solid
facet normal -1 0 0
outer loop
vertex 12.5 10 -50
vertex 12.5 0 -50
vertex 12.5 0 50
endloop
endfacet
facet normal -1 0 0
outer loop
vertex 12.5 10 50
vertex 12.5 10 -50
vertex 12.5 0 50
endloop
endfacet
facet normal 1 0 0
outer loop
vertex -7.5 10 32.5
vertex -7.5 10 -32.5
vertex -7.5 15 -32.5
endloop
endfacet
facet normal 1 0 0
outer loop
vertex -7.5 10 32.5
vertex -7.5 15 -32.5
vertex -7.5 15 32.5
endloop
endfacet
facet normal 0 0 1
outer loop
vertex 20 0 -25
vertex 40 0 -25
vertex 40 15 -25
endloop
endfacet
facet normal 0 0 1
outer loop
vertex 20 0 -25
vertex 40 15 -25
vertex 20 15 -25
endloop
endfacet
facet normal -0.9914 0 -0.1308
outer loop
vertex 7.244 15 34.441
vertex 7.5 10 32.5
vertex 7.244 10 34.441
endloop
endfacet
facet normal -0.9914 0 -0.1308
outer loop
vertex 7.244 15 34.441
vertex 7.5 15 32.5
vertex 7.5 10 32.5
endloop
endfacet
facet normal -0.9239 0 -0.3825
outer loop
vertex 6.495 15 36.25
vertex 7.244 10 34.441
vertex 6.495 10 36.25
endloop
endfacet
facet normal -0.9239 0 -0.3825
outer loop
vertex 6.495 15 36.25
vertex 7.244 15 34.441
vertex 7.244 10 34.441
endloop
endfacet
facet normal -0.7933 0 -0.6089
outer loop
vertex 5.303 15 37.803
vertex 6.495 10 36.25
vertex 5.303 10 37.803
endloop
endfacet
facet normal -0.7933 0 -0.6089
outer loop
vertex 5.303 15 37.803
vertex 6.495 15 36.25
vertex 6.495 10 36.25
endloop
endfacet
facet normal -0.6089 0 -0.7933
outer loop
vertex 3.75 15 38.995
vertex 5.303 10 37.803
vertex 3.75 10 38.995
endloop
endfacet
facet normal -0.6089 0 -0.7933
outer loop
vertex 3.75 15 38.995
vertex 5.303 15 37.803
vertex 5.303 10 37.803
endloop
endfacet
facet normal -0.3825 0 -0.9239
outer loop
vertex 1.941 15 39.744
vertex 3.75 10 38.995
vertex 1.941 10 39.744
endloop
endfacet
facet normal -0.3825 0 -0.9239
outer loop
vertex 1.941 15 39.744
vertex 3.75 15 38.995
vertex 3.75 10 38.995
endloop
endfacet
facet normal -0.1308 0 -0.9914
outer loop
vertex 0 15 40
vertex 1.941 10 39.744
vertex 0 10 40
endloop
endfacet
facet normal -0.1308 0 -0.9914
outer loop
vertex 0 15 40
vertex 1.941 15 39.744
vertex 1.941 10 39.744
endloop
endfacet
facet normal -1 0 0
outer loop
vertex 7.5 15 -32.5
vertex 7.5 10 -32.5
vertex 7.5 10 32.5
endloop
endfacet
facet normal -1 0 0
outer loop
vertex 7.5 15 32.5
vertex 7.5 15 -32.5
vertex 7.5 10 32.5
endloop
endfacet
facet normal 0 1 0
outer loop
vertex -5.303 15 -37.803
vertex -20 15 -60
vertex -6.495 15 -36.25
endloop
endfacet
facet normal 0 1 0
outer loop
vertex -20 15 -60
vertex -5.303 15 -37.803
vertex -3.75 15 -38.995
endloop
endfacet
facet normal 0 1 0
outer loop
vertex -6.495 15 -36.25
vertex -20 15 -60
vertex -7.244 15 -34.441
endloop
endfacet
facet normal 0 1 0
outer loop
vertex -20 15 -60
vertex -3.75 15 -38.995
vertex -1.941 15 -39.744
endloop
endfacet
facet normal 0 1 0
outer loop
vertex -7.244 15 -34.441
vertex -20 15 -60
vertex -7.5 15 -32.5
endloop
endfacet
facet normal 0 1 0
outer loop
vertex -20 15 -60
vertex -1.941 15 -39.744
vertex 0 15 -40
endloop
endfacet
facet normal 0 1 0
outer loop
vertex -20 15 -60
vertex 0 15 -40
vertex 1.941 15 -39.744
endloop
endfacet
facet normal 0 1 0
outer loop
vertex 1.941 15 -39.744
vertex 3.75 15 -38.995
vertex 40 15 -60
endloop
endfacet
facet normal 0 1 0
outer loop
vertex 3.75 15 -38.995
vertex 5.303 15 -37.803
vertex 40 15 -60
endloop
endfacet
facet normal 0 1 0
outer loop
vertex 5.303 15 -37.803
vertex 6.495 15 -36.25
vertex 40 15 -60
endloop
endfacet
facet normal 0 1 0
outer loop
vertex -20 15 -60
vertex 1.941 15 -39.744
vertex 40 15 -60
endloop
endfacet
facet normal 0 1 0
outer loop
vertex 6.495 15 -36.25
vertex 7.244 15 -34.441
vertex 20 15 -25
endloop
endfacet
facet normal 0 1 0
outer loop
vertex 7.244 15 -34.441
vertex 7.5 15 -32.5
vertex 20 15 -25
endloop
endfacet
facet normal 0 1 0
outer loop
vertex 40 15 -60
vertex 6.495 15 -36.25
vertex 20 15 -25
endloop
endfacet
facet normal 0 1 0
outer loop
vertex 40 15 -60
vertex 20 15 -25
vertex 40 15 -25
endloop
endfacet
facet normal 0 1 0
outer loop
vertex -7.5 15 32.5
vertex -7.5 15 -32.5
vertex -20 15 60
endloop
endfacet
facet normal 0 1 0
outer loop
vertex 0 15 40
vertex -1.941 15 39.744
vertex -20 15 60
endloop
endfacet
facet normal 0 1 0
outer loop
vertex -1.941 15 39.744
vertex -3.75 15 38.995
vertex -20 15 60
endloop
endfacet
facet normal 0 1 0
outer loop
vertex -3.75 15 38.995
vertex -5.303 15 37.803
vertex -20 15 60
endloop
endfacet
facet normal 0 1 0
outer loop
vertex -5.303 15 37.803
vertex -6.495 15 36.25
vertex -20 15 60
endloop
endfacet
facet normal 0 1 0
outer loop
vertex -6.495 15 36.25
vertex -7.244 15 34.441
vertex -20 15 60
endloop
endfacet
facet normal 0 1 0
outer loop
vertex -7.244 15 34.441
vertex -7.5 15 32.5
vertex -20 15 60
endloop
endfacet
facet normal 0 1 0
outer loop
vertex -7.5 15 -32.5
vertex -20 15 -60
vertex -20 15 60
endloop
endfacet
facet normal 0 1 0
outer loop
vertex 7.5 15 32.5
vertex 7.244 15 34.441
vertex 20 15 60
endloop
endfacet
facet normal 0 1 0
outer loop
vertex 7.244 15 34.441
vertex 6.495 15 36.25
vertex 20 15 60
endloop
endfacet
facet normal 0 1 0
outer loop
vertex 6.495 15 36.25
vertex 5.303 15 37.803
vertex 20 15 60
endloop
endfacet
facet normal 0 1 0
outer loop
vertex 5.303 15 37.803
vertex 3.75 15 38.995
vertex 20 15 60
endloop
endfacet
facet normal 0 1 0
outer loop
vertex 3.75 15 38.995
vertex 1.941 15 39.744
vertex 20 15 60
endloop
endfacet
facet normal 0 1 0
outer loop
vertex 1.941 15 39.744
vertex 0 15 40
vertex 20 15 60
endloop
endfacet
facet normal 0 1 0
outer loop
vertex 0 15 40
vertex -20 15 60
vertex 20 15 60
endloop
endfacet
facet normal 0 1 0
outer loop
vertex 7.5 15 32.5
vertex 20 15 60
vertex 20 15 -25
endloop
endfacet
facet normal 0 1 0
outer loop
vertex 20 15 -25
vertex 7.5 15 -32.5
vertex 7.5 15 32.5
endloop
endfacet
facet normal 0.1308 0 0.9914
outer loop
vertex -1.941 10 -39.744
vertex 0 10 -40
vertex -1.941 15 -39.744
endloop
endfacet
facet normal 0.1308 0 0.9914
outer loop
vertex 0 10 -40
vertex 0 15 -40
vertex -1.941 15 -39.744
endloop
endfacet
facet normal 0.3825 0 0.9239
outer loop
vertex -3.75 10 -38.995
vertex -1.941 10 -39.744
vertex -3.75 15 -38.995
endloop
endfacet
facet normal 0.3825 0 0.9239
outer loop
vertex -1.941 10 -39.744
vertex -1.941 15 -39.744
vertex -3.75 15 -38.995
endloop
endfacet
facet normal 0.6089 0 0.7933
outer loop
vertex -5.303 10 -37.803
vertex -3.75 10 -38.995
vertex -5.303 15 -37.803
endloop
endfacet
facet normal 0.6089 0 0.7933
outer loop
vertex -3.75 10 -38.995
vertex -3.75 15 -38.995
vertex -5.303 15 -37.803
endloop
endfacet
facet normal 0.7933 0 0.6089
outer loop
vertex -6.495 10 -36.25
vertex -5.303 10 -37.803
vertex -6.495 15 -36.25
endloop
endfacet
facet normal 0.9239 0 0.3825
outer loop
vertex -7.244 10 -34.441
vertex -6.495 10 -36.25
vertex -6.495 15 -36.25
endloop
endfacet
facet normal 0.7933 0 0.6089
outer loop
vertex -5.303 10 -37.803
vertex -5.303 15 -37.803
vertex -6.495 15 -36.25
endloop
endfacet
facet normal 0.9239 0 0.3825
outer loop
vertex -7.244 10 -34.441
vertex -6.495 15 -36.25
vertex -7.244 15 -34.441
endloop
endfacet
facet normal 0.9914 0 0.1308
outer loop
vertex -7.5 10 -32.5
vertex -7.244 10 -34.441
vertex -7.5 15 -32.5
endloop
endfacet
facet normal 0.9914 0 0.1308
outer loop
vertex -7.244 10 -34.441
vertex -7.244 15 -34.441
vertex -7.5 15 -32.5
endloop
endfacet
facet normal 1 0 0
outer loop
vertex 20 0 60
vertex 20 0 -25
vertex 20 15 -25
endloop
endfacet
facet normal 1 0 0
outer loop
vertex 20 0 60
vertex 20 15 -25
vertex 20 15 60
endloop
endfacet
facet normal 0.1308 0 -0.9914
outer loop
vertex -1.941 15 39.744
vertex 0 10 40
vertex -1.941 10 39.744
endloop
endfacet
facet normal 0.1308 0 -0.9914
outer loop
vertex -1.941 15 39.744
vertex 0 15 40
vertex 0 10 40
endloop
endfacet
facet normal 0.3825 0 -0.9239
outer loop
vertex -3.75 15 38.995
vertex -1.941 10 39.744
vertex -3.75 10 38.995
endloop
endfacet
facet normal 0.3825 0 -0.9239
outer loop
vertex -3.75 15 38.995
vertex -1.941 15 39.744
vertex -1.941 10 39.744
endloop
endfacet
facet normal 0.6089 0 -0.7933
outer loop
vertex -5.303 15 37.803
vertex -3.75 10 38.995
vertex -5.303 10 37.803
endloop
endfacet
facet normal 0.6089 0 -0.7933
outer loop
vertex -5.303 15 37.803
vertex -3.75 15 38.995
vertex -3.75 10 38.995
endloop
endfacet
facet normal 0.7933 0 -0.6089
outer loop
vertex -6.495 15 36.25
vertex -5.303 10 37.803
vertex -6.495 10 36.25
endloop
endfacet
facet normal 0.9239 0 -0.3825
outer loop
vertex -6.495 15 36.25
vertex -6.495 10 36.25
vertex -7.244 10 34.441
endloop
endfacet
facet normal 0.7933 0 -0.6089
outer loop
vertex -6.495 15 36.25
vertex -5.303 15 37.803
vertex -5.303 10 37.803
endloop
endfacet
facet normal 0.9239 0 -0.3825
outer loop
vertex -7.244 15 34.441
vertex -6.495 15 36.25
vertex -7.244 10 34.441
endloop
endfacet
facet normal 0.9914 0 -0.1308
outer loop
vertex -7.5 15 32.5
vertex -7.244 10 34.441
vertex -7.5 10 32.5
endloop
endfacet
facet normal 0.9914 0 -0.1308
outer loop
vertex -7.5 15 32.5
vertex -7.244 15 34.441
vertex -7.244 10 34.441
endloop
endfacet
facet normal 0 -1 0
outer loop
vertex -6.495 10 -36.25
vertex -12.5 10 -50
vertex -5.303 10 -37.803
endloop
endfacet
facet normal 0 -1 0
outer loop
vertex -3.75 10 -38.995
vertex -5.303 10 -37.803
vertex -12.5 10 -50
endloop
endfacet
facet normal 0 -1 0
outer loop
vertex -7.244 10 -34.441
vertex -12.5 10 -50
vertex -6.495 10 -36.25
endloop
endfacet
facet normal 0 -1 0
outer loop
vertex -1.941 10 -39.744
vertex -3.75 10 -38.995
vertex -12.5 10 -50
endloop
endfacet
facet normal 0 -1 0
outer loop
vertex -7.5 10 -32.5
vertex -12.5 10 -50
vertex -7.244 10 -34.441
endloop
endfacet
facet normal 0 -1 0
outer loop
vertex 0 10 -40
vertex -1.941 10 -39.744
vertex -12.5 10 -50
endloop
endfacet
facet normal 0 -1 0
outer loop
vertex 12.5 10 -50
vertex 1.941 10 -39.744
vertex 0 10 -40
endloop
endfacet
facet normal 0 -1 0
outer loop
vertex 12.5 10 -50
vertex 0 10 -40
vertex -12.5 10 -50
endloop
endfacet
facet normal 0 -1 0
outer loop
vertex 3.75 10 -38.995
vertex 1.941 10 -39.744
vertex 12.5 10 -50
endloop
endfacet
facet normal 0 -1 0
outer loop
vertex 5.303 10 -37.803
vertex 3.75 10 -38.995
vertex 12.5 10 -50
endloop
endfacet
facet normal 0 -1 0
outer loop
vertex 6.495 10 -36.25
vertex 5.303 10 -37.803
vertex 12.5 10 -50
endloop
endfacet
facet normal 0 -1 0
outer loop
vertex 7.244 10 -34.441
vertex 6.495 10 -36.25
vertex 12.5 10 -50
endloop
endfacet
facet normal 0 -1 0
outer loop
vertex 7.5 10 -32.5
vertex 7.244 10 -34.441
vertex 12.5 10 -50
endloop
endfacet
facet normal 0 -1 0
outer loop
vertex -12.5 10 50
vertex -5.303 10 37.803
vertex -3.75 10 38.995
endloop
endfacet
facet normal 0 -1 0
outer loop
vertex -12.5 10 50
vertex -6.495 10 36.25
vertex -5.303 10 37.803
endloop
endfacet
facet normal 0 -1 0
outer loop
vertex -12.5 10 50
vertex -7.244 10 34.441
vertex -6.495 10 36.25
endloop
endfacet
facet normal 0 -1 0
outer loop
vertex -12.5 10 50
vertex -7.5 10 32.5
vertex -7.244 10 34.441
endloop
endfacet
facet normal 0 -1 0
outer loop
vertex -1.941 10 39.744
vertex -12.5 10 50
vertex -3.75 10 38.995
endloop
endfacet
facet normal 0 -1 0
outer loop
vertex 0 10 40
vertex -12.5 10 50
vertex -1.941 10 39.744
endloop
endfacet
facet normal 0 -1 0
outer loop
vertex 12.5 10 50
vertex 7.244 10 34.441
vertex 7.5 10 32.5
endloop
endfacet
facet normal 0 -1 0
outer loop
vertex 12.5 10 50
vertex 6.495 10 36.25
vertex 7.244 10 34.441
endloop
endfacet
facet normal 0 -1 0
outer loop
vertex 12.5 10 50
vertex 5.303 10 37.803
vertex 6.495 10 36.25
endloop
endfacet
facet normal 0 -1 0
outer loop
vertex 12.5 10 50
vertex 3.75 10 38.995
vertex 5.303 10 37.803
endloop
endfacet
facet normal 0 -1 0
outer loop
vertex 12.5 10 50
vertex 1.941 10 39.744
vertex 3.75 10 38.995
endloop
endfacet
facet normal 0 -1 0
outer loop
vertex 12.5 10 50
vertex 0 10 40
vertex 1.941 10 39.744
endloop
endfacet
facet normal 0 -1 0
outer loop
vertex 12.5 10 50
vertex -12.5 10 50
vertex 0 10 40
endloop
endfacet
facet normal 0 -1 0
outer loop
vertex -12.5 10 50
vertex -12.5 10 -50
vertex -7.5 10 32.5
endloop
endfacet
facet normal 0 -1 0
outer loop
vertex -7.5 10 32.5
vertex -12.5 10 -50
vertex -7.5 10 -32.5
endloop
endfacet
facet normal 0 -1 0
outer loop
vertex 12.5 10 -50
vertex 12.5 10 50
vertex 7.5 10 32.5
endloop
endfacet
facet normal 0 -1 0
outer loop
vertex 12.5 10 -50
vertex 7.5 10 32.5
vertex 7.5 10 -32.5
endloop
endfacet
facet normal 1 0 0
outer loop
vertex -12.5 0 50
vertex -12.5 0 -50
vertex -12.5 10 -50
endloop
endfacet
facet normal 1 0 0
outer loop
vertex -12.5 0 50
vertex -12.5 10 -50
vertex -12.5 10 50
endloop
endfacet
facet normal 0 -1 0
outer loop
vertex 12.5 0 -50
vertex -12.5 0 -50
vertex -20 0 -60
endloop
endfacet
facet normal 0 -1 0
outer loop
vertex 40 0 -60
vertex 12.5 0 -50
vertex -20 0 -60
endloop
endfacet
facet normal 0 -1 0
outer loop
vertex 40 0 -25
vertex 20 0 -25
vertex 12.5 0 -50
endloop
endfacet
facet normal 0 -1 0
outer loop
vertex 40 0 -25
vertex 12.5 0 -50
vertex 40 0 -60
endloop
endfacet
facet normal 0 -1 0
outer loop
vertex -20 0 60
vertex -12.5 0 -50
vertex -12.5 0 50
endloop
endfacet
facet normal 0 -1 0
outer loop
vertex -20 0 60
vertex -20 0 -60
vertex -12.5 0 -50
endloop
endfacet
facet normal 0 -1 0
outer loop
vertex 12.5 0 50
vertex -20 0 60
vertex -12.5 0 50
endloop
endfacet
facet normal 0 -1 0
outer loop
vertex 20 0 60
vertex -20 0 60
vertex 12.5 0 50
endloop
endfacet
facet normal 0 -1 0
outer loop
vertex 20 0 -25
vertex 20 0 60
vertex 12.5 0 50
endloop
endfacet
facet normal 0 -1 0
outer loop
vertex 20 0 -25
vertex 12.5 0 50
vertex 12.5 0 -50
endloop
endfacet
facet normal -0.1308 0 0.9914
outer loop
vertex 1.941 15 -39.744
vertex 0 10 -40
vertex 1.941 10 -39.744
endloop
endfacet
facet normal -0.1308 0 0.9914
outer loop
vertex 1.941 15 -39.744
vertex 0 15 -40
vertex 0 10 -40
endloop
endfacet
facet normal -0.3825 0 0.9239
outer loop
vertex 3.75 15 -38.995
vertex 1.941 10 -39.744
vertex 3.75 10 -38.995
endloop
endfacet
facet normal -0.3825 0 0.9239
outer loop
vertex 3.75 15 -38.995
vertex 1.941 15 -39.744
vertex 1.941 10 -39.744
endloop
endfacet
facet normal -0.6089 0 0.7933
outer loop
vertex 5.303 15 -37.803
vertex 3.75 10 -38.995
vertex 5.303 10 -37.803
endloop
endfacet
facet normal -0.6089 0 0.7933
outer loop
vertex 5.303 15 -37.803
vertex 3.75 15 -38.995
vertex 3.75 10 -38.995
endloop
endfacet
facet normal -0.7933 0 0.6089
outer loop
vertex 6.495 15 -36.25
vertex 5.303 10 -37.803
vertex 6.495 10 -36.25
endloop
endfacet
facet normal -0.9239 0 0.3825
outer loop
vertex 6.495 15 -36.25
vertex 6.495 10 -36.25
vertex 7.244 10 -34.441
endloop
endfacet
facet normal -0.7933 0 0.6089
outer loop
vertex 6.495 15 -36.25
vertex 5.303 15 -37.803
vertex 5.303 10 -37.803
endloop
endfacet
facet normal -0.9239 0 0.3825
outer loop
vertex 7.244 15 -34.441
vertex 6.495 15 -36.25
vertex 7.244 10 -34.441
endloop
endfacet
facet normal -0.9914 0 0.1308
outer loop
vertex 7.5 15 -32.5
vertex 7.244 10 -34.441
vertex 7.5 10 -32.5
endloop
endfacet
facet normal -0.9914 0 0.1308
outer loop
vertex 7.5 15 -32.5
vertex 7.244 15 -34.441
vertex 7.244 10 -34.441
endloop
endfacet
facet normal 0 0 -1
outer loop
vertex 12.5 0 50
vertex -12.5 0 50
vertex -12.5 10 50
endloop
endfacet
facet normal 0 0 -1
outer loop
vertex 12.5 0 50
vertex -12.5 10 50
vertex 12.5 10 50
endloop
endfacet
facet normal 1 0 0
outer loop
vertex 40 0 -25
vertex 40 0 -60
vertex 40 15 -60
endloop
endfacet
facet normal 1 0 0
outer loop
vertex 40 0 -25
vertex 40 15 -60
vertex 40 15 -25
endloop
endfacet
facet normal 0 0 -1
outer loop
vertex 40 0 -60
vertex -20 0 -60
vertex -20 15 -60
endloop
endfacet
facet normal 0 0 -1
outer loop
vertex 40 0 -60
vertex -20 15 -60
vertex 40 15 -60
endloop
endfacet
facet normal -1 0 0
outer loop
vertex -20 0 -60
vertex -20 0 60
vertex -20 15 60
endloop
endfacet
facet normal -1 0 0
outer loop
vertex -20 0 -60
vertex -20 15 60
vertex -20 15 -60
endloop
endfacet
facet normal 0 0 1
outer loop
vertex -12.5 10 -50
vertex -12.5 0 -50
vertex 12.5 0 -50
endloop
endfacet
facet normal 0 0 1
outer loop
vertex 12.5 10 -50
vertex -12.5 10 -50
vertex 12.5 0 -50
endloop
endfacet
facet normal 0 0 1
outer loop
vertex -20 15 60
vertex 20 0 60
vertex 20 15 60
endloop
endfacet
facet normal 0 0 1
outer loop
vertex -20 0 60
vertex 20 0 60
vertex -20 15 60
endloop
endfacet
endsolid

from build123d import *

# Parameters (mm, degrees)
F0_W     = 25
F0_H     = 100
F0_W_2   = 15
F0_H_2   = 80
F1_DEPTH = 15
F2_DEPTH = 10
F3_DEPTH = 15.001
F4_R     = 7.49999


# Not quite as in the source:
# - a fillet or chamfer is up to 0.001 mm smaller than in the source, because OpenCascade refuses the exact size


with BuildPart() as f1:
    # F0 (on Front) → F1 (new body)
    with BuildSketch(Plane.XZ):
        Polygon((20, -25), (20, 60), (-20, 60), (-20, -60), (40, -60), (40, -25), align=None)
        Rectangle(F0_W, F0_H, mode=Mode.SUBTRACT)
        Rectangle(F0_W, F0_H)
        Rectangle(F0_W_2, F0_H_2, mode=Mode.SUBTRACT)
        Rectangle(F0_W_2, F0_H_2)
    extrude(amount=-F1_DEPTH)

    # F0 (on Front) → F2 (cut)
    with BuildSketch(Plane.XZ):
        Rectangle(F0_W, F0_H)
        Rectangle(F0_W_2, F0_H_2, mode=Mode.SUBTRACT)
    extrude(amount=-F2_DEPTH, mode=Mode.SUBTRACT)

    # F0 (on Front) → F3 (cut, through all)
    with BuildSketch(Plane.XZ):
        Rectangle(F0_W_2, F0_H_2)
    extrude(amount=-F3_DEPTH, mode=Mode.SUBTRACT)

    # F4 (radius 7.5 in the source; OpenCascade refuses exactly that, so slightly less here)
    f4_edges = [f1.edges().sort_by_distance(p)[0] for p in [
        (-7.5, 12.5, 40),
        (7.5, 12.5, 40),
        (-7.5, 12.5, -40),
        (7.5, 12.5, -40),
    ]]
    fillet(f4_edges, radius=F4_R)


solid = f1.part
